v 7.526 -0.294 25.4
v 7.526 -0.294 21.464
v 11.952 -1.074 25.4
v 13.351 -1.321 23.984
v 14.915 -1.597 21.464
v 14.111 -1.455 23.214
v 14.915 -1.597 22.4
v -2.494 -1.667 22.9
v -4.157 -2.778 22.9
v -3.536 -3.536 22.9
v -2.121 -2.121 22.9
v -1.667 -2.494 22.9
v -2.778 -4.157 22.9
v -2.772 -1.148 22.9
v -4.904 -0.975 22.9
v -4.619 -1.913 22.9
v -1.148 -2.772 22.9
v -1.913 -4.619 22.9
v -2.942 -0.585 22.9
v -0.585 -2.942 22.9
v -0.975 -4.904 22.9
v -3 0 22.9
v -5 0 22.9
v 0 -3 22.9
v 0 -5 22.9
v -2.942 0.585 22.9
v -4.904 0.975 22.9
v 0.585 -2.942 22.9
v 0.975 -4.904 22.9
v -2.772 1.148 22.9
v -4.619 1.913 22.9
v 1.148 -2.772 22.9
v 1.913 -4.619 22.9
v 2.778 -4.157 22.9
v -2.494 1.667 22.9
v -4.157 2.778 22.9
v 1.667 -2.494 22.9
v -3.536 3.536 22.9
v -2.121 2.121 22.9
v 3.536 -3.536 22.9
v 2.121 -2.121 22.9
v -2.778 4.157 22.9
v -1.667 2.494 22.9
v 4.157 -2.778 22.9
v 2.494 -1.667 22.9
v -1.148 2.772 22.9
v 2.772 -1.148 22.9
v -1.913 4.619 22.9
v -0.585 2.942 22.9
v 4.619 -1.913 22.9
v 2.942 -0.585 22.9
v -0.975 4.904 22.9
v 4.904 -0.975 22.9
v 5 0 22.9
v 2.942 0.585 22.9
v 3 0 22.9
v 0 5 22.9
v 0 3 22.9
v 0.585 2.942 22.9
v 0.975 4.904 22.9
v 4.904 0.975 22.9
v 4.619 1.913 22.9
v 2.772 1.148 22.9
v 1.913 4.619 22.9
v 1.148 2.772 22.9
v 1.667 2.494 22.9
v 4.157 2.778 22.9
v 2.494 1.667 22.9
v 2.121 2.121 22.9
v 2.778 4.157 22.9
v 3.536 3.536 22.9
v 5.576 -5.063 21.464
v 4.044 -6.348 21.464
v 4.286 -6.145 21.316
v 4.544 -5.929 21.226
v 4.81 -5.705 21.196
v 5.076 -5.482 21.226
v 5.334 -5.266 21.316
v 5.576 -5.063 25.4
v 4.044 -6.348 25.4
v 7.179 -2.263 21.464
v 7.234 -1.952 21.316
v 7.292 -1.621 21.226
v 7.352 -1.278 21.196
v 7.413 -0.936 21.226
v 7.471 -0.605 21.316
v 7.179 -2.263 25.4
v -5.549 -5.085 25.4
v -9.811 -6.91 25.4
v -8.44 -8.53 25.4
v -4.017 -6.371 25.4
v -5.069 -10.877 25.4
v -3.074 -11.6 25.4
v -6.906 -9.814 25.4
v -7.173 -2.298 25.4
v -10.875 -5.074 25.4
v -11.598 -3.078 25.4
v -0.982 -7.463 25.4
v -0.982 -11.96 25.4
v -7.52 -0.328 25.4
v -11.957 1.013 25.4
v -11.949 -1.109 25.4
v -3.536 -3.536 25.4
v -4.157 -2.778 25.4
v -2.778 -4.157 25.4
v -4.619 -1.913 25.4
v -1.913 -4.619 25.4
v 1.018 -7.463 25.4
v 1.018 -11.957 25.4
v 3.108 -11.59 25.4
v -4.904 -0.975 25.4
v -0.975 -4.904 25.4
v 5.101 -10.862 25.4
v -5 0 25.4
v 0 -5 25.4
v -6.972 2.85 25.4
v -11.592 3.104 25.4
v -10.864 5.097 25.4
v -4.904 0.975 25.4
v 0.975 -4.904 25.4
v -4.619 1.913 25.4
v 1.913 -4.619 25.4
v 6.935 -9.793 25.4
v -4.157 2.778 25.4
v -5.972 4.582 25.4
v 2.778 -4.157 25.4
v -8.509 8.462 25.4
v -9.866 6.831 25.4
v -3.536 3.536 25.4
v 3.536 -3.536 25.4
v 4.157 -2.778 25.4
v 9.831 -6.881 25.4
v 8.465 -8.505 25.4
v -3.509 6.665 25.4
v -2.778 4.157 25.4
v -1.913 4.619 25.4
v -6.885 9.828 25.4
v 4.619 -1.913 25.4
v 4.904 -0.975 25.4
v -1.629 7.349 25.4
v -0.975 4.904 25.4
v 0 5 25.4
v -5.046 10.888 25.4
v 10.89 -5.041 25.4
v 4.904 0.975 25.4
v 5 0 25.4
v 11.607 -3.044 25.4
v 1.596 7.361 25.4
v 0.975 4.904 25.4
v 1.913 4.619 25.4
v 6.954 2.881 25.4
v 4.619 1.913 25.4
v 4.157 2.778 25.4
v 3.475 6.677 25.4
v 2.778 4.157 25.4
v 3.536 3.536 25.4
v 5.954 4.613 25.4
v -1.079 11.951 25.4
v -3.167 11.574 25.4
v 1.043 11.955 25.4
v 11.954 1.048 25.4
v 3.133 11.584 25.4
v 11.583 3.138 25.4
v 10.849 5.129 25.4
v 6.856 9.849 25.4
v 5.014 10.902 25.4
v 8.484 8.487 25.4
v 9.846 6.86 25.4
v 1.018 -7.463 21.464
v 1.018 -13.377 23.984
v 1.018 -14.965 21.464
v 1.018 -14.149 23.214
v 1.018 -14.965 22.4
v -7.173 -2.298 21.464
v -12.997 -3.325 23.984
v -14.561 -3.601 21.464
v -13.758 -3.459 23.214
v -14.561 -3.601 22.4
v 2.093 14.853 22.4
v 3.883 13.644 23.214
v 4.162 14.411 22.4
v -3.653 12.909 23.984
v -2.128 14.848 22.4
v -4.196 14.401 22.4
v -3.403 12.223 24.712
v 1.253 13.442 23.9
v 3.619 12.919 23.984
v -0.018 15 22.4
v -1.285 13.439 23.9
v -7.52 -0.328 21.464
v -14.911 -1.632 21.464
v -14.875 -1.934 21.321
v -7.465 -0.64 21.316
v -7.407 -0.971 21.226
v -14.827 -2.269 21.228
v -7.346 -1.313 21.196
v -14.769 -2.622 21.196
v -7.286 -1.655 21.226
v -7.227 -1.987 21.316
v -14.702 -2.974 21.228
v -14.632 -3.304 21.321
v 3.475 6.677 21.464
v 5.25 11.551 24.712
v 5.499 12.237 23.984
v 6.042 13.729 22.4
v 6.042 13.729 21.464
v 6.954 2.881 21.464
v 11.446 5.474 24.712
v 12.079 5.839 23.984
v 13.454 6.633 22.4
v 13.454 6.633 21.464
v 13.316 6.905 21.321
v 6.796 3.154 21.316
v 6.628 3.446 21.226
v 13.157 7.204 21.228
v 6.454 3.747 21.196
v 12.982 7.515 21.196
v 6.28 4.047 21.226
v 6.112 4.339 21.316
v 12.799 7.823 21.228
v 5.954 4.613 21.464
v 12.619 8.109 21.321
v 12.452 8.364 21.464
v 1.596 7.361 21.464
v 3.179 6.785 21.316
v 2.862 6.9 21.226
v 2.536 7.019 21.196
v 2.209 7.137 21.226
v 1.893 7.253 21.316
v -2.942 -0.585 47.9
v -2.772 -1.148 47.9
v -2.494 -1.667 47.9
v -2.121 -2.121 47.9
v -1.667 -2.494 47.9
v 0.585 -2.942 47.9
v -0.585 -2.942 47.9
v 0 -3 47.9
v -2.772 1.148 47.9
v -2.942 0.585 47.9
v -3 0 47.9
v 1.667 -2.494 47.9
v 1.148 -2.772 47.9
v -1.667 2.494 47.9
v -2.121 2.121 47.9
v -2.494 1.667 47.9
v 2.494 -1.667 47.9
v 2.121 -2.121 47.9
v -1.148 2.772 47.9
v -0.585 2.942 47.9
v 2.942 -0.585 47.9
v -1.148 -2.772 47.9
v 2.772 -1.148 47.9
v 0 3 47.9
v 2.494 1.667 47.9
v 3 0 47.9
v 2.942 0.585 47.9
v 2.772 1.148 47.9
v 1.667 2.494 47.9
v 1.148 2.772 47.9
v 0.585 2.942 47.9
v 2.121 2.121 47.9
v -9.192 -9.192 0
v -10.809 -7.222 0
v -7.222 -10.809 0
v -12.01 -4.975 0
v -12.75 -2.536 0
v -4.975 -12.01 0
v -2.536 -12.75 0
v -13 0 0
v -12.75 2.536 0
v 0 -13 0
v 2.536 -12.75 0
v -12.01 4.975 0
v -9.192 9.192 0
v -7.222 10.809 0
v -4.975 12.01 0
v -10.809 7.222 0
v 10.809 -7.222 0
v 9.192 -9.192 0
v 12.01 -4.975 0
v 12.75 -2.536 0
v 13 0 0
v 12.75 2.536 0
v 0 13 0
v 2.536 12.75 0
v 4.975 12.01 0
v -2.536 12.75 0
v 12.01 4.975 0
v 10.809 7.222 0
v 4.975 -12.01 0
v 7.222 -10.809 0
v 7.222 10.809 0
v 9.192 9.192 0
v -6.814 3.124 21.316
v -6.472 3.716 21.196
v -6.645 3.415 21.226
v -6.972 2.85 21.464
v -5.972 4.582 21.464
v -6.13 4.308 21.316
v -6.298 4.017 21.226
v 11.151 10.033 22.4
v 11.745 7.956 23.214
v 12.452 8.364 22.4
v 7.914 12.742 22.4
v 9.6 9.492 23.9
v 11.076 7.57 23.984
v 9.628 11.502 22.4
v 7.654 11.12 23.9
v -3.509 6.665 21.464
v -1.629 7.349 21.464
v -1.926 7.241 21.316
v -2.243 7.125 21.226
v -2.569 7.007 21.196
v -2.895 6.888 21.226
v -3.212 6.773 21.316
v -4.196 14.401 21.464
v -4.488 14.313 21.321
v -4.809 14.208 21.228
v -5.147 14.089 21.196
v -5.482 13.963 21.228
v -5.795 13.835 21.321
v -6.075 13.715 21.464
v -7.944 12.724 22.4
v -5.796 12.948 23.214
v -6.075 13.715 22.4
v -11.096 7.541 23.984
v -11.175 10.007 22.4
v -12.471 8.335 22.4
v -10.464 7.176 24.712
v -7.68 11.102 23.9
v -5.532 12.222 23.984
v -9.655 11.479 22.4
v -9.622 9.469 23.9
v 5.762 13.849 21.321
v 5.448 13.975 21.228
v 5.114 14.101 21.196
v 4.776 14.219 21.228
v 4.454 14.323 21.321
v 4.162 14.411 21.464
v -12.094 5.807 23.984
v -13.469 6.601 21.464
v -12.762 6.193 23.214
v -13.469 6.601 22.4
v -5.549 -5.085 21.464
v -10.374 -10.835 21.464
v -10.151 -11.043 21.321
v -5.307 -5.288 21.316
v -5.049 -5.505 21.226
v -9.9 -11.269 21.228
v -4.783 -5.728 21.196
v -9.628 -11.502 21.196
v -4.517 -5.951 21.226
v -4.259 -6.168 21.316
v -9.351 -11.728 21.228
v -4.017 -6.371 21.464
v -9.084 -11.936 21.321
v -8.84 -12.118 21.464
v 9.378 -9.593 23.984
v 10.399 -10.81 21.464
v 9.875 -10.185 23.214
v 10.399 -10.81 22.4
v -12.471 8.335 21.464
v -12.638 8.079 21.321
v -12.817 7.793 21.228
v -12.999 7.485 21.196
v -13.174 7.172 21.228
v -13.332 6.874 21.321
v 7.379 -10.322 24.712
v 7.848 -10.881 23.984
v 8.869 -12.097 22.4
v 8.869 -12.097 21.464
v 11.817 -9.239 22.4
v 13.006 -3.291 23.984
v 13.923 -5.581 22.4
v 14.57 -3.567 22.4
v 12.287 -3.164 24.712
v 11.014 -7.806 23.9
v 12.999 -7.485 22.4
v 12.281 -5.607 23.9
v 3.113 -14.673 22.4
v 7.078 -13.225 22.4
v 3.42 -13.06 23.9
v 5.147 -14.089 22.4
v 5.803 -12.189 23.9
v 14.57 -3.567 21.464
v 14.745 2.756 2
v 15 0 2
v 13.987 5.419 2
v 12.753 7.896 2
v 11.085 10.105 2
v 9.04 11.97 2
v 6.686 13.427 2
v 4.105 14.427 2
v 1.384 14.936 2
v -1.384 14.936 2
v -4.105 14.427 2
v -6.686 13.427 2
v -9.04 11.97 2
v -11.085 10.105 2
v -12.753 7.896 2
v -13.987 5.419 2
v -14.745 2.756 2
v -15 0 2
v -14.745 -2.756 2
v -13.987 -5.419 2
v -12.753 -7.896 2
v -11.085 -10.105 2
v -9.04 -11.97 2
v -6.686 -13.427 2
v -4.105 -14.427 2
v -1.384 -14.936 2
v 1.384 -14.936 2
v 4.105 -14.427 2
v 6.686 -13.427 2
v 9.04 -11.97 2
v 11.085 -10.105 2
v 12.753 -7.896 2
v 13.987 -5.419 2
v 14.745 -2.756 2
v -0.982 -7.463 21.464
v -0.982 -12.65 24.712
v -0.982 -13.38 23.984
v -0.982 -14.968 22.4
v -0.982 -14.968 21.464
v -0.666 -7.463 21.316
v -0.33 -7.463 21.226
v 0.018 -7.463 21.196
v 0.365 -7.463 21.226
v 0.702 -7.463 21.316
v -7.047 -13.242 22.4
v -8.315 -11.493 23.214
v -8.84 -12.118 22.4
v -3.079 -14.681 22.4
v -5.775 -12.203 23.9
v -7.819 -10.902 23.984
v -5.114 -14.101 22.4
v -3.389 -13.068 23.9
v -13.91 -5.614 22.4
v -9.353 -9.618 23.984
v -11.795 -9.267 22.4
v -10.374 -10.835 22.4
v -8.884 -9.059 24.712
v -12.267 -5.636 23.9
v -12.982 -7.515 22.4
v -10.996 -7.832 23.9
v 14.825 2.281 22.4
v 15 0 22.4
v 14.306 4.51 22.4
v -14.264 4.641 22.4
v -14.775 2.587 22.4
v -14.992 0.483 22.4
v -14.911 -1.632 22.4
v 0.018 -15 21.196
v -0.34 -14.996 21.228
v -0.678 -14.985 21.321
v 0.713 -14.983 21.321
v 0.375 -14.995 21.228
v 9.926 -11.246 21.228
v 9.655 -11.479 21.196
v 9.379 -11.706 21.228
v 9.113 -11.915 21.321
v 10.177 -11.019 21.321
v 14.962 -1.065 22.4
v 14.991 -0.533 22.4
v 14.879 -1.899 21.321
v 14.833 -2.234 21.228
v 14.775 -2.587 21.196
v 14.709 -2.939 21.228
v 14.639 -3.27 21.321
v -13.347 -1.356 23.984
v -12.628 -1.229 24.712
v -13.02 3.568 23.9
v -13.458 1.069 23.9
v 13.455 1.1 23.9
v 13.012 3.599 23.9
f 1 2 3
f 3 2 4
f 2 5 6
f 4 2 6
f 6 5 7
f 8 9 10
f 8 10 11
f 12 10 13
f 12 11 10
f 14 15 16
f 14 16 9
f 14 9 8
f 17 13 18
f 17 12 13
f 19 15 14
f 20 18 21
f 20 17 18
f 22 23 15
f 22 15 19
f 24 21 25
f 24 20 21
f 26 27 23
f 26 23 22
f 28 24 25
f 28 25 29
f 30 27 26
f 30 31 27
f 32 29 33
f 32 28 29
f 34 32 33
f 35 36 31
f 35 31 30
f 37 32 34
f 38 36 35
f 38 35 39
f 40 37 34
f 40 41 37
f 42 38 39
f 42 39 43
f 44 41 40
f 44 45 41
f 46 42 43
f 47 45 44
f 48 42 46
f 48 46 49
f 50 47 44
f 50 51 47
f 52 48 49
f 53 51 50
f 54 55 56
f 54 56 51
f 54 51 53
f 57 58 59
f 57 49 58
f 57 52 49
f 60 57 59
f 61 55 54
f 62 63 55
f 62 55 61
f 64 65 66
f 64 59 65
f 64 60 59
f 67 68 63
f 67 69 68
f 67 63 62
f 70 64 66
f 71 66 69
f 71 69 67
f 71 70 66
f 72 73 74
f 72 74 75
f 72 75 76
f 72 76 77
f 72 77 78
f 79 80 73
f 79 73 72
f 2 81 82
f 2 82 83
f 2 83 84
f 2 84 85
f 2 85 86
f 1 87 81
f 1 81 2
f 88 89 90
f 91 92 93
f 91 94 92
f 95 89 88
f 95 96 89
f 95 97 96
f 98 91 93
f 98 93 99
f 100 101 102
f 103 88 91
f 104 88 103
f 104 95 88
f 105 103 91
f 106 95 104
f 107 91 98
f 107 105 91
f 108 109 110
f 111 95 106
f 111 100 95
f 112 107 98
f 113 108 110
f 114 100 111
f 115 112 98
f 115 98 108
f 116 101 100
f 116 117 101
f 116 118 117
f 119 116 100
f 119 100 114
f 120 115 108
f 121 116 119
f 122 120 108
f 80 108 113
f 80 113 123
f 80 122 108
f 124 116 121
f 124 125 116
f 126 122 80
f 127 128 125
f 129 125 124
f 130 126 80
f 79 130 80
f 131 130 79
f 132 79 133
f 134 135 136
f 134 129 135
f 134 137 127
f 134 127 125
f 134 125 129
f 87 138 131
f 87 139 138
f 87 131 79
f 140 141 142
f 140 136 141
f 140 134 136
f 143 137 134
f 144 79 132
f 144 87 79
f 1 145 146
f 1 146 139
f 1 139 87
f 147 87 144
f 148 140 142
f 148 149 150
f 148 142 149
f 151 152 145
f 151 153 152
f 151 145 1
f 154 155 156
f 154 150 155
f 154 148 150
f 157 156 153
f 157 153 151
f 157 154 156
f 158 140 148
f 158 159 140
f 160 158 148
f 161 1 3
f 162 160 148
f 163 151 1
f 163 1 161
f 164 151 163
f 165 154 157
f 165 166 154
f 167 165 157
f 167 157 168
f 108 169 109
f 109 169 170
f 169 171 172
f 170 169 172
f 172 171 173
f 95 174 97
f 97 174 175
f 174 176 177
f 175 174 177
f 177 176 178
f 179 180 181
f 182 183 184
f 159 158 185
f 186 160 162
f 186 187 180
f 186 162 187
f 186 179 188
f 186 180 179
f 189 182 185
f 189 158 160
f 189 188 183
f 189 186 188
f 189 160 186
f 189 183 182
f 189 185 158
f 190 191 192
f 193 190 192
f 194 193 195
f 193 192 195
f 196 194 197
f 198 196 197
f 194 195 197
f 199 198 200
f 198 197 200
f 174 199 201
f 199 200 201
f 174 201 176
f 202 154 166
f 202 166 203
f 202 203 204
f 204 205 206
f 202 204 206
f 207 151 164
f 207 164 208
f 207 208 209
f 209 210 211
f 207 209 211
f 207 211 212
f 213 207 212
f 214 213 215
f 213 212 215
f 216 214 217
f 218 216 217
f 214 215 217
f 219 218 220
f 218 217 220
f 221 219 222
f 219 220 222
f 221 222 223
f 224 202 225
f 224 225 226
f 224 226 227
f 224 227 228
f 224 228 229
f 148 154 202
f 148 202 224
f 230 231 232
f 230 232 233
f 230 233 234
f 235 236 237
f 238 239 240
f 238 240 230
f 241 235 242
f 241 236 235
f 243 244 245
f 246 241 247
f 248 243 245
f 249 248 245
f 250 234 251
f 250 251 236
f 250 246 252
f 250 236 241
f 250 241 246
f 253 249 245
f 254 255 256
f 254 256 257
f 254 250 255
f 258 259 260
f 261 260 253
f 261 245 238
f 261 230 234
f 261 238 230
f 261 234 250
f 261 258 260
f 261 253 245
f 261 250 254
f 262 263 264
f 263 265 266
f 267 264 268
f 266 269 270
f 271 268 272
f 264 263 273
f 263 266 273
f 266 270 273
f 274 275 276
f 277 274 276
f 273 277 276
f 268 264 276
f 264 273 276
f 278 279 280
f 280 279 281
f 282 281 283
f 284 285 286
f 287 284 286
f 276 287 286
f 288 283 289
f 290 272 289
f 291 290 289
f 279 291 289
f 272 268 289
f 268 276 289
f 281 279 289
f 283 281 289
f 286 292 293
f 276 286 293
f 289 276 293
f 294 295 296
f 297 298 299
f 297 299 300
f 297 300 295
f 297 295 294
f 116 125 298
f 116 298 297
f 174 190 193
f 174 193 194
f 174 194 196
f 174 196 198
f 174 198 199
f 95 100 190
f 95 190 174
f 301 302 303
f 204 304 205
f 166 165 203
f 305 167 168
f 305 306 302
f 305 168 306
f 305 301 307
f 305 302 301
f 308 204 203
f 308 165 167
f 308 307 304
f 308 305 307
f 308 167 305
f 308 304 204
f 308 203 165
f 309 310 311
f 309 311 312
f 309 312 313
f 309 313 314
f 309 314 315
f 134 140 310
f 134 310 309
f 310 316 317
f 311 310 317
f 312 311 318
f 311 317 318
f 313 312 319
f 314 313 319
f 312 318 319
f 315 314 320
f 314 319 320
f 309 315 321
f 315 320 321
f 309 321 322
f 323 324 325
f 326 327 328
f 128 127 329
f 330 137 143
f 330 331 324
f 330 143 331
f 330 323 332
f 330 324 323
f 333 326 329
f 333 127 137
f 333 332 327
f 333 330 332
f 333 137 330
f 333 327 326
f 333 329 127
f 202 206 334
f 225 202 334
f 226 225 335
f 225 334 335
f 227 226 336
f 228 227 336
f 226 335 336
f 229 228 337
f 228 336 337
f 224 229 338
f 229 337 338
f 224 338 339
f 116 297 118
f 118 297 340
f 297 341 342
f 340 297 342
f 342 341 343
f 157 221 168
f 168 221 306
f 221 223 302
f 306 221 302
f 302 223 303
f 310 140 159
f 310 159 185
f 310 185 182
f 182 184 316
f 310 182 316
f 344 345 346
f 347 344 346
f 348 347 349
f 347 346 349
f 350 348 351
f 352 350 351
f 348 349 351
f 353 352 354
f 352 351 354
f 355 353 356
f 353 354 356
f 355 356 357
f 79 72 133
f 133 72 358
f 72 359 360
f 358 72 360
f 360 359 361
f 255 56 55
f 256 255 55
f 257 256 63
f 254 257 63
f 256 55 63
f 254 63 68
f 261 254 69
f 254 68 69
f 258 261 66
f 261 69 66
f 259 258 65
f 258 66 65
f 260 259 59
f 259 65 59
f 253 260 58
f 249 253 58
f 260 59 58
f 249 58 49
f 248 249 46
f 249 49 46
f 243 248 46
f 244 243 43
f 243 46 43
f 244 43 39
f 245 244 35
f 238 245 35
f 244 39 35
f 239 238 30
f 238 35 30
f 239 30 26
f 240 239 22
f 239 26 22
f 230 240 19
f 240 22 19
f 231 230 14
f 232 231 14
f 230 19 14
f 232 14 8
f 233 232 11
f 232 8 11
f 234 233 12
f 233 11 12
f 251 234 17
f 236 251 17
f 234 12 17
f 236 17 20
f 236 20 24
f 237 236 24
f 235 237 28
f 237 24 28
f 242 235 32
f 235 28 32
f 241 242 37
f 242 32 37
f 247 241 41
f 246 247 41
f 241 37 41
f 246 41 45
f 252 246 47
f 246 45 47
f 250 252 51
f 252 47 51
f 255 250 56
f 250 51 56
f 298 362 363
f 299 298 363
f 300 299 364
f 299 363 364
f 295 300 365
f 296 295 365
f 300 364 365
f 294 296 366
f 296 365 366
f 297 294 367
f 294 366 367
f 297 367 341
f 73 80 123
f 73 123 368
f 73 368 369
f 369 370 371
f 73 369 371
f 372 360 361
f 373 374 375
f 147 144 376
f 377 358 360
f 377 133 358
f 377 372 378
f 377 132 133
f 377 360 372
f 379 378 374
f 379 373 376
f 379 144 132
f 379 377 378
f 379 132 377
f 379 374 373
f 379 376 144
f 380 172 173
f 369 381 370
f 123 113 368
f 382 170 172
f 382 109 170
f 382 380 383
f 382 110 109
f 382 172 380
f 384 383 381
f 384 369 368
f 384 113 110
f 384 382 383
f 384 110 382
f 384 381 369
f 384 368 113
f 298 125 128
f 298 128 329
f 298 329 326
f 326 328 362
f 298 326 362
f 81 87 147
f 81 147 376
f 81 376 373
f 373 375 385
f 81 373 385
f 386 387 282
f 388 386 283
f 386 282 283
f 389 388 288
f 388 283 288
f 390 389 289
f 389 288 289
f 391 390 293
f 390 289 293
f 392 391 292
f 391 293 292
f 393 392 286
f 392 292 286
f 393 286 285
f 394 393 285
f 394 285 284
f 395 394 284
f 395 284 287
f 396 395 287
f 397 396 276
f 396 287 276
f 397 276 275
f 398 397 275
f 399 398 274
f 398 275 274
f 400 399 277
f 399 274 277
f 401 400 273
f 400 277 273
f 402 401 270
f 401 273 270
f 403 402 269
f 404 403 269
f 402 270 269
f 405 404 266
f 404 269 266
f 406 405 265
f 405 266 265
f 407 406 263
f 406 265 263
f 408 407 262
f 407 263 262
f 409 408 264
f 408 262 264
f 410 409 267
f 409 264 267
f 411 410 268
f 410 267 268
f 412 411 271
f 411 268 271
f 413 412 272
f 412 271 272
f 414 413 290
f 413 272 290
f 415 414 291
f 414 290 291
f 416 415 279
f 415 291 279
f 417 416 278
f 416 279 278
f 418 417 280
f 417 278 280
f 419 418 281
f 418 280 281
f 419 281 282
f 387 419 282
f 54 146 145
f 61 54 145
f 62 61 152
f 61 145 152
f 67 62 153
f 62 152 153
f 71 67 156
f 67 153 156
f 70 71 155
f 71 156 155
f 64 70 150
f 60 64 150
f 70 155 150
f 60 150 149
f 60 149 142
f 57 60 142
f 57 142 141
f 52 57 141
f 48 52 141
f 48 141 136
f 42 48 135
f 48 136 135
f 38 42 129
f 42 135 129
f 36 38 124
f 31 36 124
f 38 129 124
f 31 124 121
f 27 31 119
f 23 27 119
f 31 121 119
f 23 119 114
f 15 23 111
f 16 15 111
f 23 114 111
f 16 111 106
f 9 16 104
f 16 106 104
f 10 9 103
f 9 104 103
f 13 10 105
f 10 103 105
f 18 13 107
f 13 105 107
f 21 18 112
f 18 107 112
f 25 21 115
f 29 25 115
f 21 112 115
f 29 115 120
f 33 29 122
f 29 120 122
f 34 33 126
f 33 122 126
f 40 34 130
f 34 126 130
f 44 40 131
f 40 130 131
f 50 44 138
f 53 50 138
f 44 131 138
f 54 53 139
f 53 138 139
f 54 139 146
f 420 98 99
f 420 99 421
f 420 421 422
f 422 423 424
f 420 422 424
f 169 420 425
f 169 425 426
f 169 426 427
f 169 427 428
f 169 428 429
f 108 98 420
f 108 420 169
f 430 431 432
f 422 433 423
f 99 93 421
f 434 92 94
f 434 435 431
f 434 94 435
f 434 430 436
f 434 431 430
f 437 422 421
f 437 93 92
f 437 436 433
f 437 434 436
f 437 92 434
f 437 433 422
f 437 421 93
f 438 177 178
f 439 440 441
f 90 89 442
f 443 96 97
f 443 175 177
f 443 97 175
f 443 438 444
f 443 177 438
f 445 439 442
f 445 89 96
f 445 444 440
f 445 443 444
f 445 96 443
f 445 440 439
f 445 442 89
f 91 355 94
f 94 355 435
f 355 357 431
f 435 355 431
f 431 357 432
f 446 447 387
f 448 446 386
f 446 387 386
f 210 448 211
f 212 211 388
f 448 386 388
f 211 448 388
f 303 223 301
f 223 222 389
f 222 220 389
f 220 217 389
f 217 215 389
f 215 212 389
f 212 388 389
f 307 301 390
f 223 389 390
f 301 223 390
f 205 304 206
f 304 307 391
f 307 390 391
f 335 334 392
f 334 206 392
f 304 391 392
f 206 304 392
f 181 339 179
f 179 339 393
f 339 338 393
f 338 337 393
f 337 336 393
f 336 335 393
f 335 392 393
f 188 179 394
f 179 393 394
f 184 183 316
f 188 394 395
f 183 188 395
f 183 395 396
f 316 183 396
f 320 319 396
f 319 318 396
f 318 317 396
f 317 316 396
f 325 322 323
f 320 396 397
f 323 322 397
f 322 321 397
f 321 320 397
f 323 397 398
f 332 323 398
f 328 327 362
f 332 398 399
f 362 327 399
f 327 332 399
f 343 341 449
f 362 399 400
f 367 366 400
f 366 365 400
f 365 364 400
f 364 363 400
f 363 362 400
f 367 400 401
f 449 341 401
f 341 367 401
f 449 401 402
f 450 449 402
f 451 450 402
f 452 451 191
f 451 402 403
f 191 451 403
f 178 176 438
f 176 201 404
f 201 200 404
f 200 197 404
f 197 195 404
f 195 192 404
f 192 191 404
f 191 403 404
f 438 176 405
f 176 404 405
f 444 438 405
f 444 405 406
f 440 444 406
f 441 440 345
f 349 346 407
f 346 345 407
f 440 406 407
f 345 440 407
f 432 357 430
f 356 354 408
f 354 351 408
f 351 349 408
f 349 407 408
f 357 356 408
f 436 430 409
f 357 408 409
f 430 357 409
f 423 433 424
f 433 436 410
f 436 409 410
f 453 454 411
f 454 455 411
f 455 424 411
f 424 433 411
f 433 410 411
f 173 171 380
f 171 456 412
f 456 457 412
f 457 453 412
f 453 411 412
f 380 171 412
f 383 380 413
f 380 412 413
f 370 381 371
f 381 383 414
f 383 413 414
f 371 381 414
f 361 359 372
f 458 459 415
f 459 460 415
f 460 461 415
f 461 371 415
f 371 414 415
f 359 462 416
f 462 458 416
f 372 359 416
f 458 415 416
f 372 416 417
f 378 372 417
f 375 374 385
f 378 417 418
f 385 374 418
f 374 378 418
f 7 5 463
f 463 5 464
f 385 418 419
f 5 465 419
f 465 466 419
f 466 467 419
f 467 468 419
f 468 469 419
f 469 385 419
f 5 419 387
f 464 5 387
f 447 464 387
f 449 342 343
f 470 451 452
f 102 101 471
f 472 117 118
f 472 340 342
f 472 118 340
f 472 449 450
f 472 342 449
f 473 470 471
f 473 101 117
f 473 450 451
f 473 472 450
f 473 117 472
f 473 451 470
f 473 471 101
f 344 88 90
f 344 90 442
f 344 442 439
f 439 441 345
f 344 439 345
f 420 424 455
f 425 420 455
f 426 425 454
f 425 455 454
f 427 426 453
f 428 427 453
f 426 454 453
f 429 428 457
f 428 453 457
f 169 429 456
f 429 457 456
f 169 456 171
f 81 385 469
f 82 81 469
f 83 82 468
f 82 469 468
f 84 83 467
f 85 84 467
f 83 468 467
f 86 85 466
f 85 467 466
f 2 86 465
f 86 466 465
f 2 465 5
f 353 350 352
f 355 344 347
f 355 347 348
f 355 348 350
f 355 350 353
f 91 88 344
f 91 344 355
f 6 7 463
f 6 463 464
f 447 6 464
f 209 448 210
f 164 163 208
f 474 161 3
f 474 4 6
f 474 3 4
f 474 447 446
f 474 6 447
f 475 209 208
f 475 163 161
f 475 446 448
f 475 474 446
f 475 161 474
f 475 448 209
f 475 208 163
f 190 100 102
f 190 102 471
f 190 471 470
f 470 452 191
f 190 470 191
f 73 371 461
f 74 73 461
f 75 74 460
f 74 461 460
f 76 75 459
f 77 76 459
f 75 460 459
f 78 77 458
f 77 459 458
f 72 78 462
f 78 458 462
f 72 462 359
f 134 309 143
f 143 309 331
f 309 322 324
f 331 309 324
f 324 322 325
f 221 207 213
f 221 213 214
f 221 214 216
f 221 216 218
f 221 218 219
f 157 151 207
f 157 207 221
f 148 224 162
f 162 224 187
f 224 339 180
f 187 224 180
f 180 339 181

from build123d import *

# Parameters (mm, degrees)
F0_R             = 15
F1_DEPTH         = 25.4
F2_SIZE          = 3
F3_SIZE          = 2
F4_R             = 5
F5_DEPTH         = 2.5
F6_R             = 3
F7_DEPTH         = 25
F10_DEPTH        = 7.53734
F10_COPIES_COUNT = 9


# Not quite as in the source:
# - a pattern or mirror of a feature is missing from the dataset's text; its kind, count and spacing are read off the source's solid


with BuildPart() as f1:
    # F0 (on Top) → F1 (new body)
    with BuildSketch(Plane.XY):
        Circle(F0_R)
    extrude(amount=F1_DEPTH)

    # F2
    f2_edges = [f1.edges().sort_by_distance(p)[0] for p in [
        (-15, 0, 25.4),
    ]]
    chamfer(f2_edges, length=F2_SIZE)

    # F3
    f3_edges = [f1.edges().sort_by_distance(p)[0] for p in [
        (-15, 0, 0),
    ]]
    chamfer(f3_edges, length=F3_SIZE)

    # F4 (on face) → F5 (cut)
    with BuildSketch(Plane.XY.offset(25.4)):
        Circle(F4_R)
    extrude(amount=-F5_DEPTH, mode=Mode.SUBTRACT)

    # F6 (on face) → F7 (join)
    with BuildSketch(Plane.XY.offset(22.9)):
        Circle(F6_R)
    extrude(amount=F7_DEPTH)

    # F9 (on offset) → F10 (cut)
    with BuildSketch(Plane.XZ.offset(15)):
        with BuildLine():
            Line((1.0176621057, 25.4637251124), (-0.9823378943, 25.4637251124))
            Line((-0.9823378943, 25.4637251124), (-0.9823378943, 21.4637251124))
            ThreePointArc((-0.9823378943, 21.4637251124), (0.0176621057, 21.1957759199), (1.0176621057, 21.4637251124))
            Line((1.0176621057, 21.4637251124), (1.0176621057, 25.4637251124))
        make_face()
    f10 = extrude(amount=-F10_DEPTH, mode=Mode.SUBTRACT)

    # F10_copies: F10 ×9 about axis
    f10_copies_axis = Axis((0, 0, 0), (0, 0, 1))
    for i in range(1, F10_COPIES_COUNT):
        add(f10.rotate(f10_copies_axis, i * 360 / F10_COPIES_COUNT), mode=Mode.SUBTRACT)


solid = f1.part
